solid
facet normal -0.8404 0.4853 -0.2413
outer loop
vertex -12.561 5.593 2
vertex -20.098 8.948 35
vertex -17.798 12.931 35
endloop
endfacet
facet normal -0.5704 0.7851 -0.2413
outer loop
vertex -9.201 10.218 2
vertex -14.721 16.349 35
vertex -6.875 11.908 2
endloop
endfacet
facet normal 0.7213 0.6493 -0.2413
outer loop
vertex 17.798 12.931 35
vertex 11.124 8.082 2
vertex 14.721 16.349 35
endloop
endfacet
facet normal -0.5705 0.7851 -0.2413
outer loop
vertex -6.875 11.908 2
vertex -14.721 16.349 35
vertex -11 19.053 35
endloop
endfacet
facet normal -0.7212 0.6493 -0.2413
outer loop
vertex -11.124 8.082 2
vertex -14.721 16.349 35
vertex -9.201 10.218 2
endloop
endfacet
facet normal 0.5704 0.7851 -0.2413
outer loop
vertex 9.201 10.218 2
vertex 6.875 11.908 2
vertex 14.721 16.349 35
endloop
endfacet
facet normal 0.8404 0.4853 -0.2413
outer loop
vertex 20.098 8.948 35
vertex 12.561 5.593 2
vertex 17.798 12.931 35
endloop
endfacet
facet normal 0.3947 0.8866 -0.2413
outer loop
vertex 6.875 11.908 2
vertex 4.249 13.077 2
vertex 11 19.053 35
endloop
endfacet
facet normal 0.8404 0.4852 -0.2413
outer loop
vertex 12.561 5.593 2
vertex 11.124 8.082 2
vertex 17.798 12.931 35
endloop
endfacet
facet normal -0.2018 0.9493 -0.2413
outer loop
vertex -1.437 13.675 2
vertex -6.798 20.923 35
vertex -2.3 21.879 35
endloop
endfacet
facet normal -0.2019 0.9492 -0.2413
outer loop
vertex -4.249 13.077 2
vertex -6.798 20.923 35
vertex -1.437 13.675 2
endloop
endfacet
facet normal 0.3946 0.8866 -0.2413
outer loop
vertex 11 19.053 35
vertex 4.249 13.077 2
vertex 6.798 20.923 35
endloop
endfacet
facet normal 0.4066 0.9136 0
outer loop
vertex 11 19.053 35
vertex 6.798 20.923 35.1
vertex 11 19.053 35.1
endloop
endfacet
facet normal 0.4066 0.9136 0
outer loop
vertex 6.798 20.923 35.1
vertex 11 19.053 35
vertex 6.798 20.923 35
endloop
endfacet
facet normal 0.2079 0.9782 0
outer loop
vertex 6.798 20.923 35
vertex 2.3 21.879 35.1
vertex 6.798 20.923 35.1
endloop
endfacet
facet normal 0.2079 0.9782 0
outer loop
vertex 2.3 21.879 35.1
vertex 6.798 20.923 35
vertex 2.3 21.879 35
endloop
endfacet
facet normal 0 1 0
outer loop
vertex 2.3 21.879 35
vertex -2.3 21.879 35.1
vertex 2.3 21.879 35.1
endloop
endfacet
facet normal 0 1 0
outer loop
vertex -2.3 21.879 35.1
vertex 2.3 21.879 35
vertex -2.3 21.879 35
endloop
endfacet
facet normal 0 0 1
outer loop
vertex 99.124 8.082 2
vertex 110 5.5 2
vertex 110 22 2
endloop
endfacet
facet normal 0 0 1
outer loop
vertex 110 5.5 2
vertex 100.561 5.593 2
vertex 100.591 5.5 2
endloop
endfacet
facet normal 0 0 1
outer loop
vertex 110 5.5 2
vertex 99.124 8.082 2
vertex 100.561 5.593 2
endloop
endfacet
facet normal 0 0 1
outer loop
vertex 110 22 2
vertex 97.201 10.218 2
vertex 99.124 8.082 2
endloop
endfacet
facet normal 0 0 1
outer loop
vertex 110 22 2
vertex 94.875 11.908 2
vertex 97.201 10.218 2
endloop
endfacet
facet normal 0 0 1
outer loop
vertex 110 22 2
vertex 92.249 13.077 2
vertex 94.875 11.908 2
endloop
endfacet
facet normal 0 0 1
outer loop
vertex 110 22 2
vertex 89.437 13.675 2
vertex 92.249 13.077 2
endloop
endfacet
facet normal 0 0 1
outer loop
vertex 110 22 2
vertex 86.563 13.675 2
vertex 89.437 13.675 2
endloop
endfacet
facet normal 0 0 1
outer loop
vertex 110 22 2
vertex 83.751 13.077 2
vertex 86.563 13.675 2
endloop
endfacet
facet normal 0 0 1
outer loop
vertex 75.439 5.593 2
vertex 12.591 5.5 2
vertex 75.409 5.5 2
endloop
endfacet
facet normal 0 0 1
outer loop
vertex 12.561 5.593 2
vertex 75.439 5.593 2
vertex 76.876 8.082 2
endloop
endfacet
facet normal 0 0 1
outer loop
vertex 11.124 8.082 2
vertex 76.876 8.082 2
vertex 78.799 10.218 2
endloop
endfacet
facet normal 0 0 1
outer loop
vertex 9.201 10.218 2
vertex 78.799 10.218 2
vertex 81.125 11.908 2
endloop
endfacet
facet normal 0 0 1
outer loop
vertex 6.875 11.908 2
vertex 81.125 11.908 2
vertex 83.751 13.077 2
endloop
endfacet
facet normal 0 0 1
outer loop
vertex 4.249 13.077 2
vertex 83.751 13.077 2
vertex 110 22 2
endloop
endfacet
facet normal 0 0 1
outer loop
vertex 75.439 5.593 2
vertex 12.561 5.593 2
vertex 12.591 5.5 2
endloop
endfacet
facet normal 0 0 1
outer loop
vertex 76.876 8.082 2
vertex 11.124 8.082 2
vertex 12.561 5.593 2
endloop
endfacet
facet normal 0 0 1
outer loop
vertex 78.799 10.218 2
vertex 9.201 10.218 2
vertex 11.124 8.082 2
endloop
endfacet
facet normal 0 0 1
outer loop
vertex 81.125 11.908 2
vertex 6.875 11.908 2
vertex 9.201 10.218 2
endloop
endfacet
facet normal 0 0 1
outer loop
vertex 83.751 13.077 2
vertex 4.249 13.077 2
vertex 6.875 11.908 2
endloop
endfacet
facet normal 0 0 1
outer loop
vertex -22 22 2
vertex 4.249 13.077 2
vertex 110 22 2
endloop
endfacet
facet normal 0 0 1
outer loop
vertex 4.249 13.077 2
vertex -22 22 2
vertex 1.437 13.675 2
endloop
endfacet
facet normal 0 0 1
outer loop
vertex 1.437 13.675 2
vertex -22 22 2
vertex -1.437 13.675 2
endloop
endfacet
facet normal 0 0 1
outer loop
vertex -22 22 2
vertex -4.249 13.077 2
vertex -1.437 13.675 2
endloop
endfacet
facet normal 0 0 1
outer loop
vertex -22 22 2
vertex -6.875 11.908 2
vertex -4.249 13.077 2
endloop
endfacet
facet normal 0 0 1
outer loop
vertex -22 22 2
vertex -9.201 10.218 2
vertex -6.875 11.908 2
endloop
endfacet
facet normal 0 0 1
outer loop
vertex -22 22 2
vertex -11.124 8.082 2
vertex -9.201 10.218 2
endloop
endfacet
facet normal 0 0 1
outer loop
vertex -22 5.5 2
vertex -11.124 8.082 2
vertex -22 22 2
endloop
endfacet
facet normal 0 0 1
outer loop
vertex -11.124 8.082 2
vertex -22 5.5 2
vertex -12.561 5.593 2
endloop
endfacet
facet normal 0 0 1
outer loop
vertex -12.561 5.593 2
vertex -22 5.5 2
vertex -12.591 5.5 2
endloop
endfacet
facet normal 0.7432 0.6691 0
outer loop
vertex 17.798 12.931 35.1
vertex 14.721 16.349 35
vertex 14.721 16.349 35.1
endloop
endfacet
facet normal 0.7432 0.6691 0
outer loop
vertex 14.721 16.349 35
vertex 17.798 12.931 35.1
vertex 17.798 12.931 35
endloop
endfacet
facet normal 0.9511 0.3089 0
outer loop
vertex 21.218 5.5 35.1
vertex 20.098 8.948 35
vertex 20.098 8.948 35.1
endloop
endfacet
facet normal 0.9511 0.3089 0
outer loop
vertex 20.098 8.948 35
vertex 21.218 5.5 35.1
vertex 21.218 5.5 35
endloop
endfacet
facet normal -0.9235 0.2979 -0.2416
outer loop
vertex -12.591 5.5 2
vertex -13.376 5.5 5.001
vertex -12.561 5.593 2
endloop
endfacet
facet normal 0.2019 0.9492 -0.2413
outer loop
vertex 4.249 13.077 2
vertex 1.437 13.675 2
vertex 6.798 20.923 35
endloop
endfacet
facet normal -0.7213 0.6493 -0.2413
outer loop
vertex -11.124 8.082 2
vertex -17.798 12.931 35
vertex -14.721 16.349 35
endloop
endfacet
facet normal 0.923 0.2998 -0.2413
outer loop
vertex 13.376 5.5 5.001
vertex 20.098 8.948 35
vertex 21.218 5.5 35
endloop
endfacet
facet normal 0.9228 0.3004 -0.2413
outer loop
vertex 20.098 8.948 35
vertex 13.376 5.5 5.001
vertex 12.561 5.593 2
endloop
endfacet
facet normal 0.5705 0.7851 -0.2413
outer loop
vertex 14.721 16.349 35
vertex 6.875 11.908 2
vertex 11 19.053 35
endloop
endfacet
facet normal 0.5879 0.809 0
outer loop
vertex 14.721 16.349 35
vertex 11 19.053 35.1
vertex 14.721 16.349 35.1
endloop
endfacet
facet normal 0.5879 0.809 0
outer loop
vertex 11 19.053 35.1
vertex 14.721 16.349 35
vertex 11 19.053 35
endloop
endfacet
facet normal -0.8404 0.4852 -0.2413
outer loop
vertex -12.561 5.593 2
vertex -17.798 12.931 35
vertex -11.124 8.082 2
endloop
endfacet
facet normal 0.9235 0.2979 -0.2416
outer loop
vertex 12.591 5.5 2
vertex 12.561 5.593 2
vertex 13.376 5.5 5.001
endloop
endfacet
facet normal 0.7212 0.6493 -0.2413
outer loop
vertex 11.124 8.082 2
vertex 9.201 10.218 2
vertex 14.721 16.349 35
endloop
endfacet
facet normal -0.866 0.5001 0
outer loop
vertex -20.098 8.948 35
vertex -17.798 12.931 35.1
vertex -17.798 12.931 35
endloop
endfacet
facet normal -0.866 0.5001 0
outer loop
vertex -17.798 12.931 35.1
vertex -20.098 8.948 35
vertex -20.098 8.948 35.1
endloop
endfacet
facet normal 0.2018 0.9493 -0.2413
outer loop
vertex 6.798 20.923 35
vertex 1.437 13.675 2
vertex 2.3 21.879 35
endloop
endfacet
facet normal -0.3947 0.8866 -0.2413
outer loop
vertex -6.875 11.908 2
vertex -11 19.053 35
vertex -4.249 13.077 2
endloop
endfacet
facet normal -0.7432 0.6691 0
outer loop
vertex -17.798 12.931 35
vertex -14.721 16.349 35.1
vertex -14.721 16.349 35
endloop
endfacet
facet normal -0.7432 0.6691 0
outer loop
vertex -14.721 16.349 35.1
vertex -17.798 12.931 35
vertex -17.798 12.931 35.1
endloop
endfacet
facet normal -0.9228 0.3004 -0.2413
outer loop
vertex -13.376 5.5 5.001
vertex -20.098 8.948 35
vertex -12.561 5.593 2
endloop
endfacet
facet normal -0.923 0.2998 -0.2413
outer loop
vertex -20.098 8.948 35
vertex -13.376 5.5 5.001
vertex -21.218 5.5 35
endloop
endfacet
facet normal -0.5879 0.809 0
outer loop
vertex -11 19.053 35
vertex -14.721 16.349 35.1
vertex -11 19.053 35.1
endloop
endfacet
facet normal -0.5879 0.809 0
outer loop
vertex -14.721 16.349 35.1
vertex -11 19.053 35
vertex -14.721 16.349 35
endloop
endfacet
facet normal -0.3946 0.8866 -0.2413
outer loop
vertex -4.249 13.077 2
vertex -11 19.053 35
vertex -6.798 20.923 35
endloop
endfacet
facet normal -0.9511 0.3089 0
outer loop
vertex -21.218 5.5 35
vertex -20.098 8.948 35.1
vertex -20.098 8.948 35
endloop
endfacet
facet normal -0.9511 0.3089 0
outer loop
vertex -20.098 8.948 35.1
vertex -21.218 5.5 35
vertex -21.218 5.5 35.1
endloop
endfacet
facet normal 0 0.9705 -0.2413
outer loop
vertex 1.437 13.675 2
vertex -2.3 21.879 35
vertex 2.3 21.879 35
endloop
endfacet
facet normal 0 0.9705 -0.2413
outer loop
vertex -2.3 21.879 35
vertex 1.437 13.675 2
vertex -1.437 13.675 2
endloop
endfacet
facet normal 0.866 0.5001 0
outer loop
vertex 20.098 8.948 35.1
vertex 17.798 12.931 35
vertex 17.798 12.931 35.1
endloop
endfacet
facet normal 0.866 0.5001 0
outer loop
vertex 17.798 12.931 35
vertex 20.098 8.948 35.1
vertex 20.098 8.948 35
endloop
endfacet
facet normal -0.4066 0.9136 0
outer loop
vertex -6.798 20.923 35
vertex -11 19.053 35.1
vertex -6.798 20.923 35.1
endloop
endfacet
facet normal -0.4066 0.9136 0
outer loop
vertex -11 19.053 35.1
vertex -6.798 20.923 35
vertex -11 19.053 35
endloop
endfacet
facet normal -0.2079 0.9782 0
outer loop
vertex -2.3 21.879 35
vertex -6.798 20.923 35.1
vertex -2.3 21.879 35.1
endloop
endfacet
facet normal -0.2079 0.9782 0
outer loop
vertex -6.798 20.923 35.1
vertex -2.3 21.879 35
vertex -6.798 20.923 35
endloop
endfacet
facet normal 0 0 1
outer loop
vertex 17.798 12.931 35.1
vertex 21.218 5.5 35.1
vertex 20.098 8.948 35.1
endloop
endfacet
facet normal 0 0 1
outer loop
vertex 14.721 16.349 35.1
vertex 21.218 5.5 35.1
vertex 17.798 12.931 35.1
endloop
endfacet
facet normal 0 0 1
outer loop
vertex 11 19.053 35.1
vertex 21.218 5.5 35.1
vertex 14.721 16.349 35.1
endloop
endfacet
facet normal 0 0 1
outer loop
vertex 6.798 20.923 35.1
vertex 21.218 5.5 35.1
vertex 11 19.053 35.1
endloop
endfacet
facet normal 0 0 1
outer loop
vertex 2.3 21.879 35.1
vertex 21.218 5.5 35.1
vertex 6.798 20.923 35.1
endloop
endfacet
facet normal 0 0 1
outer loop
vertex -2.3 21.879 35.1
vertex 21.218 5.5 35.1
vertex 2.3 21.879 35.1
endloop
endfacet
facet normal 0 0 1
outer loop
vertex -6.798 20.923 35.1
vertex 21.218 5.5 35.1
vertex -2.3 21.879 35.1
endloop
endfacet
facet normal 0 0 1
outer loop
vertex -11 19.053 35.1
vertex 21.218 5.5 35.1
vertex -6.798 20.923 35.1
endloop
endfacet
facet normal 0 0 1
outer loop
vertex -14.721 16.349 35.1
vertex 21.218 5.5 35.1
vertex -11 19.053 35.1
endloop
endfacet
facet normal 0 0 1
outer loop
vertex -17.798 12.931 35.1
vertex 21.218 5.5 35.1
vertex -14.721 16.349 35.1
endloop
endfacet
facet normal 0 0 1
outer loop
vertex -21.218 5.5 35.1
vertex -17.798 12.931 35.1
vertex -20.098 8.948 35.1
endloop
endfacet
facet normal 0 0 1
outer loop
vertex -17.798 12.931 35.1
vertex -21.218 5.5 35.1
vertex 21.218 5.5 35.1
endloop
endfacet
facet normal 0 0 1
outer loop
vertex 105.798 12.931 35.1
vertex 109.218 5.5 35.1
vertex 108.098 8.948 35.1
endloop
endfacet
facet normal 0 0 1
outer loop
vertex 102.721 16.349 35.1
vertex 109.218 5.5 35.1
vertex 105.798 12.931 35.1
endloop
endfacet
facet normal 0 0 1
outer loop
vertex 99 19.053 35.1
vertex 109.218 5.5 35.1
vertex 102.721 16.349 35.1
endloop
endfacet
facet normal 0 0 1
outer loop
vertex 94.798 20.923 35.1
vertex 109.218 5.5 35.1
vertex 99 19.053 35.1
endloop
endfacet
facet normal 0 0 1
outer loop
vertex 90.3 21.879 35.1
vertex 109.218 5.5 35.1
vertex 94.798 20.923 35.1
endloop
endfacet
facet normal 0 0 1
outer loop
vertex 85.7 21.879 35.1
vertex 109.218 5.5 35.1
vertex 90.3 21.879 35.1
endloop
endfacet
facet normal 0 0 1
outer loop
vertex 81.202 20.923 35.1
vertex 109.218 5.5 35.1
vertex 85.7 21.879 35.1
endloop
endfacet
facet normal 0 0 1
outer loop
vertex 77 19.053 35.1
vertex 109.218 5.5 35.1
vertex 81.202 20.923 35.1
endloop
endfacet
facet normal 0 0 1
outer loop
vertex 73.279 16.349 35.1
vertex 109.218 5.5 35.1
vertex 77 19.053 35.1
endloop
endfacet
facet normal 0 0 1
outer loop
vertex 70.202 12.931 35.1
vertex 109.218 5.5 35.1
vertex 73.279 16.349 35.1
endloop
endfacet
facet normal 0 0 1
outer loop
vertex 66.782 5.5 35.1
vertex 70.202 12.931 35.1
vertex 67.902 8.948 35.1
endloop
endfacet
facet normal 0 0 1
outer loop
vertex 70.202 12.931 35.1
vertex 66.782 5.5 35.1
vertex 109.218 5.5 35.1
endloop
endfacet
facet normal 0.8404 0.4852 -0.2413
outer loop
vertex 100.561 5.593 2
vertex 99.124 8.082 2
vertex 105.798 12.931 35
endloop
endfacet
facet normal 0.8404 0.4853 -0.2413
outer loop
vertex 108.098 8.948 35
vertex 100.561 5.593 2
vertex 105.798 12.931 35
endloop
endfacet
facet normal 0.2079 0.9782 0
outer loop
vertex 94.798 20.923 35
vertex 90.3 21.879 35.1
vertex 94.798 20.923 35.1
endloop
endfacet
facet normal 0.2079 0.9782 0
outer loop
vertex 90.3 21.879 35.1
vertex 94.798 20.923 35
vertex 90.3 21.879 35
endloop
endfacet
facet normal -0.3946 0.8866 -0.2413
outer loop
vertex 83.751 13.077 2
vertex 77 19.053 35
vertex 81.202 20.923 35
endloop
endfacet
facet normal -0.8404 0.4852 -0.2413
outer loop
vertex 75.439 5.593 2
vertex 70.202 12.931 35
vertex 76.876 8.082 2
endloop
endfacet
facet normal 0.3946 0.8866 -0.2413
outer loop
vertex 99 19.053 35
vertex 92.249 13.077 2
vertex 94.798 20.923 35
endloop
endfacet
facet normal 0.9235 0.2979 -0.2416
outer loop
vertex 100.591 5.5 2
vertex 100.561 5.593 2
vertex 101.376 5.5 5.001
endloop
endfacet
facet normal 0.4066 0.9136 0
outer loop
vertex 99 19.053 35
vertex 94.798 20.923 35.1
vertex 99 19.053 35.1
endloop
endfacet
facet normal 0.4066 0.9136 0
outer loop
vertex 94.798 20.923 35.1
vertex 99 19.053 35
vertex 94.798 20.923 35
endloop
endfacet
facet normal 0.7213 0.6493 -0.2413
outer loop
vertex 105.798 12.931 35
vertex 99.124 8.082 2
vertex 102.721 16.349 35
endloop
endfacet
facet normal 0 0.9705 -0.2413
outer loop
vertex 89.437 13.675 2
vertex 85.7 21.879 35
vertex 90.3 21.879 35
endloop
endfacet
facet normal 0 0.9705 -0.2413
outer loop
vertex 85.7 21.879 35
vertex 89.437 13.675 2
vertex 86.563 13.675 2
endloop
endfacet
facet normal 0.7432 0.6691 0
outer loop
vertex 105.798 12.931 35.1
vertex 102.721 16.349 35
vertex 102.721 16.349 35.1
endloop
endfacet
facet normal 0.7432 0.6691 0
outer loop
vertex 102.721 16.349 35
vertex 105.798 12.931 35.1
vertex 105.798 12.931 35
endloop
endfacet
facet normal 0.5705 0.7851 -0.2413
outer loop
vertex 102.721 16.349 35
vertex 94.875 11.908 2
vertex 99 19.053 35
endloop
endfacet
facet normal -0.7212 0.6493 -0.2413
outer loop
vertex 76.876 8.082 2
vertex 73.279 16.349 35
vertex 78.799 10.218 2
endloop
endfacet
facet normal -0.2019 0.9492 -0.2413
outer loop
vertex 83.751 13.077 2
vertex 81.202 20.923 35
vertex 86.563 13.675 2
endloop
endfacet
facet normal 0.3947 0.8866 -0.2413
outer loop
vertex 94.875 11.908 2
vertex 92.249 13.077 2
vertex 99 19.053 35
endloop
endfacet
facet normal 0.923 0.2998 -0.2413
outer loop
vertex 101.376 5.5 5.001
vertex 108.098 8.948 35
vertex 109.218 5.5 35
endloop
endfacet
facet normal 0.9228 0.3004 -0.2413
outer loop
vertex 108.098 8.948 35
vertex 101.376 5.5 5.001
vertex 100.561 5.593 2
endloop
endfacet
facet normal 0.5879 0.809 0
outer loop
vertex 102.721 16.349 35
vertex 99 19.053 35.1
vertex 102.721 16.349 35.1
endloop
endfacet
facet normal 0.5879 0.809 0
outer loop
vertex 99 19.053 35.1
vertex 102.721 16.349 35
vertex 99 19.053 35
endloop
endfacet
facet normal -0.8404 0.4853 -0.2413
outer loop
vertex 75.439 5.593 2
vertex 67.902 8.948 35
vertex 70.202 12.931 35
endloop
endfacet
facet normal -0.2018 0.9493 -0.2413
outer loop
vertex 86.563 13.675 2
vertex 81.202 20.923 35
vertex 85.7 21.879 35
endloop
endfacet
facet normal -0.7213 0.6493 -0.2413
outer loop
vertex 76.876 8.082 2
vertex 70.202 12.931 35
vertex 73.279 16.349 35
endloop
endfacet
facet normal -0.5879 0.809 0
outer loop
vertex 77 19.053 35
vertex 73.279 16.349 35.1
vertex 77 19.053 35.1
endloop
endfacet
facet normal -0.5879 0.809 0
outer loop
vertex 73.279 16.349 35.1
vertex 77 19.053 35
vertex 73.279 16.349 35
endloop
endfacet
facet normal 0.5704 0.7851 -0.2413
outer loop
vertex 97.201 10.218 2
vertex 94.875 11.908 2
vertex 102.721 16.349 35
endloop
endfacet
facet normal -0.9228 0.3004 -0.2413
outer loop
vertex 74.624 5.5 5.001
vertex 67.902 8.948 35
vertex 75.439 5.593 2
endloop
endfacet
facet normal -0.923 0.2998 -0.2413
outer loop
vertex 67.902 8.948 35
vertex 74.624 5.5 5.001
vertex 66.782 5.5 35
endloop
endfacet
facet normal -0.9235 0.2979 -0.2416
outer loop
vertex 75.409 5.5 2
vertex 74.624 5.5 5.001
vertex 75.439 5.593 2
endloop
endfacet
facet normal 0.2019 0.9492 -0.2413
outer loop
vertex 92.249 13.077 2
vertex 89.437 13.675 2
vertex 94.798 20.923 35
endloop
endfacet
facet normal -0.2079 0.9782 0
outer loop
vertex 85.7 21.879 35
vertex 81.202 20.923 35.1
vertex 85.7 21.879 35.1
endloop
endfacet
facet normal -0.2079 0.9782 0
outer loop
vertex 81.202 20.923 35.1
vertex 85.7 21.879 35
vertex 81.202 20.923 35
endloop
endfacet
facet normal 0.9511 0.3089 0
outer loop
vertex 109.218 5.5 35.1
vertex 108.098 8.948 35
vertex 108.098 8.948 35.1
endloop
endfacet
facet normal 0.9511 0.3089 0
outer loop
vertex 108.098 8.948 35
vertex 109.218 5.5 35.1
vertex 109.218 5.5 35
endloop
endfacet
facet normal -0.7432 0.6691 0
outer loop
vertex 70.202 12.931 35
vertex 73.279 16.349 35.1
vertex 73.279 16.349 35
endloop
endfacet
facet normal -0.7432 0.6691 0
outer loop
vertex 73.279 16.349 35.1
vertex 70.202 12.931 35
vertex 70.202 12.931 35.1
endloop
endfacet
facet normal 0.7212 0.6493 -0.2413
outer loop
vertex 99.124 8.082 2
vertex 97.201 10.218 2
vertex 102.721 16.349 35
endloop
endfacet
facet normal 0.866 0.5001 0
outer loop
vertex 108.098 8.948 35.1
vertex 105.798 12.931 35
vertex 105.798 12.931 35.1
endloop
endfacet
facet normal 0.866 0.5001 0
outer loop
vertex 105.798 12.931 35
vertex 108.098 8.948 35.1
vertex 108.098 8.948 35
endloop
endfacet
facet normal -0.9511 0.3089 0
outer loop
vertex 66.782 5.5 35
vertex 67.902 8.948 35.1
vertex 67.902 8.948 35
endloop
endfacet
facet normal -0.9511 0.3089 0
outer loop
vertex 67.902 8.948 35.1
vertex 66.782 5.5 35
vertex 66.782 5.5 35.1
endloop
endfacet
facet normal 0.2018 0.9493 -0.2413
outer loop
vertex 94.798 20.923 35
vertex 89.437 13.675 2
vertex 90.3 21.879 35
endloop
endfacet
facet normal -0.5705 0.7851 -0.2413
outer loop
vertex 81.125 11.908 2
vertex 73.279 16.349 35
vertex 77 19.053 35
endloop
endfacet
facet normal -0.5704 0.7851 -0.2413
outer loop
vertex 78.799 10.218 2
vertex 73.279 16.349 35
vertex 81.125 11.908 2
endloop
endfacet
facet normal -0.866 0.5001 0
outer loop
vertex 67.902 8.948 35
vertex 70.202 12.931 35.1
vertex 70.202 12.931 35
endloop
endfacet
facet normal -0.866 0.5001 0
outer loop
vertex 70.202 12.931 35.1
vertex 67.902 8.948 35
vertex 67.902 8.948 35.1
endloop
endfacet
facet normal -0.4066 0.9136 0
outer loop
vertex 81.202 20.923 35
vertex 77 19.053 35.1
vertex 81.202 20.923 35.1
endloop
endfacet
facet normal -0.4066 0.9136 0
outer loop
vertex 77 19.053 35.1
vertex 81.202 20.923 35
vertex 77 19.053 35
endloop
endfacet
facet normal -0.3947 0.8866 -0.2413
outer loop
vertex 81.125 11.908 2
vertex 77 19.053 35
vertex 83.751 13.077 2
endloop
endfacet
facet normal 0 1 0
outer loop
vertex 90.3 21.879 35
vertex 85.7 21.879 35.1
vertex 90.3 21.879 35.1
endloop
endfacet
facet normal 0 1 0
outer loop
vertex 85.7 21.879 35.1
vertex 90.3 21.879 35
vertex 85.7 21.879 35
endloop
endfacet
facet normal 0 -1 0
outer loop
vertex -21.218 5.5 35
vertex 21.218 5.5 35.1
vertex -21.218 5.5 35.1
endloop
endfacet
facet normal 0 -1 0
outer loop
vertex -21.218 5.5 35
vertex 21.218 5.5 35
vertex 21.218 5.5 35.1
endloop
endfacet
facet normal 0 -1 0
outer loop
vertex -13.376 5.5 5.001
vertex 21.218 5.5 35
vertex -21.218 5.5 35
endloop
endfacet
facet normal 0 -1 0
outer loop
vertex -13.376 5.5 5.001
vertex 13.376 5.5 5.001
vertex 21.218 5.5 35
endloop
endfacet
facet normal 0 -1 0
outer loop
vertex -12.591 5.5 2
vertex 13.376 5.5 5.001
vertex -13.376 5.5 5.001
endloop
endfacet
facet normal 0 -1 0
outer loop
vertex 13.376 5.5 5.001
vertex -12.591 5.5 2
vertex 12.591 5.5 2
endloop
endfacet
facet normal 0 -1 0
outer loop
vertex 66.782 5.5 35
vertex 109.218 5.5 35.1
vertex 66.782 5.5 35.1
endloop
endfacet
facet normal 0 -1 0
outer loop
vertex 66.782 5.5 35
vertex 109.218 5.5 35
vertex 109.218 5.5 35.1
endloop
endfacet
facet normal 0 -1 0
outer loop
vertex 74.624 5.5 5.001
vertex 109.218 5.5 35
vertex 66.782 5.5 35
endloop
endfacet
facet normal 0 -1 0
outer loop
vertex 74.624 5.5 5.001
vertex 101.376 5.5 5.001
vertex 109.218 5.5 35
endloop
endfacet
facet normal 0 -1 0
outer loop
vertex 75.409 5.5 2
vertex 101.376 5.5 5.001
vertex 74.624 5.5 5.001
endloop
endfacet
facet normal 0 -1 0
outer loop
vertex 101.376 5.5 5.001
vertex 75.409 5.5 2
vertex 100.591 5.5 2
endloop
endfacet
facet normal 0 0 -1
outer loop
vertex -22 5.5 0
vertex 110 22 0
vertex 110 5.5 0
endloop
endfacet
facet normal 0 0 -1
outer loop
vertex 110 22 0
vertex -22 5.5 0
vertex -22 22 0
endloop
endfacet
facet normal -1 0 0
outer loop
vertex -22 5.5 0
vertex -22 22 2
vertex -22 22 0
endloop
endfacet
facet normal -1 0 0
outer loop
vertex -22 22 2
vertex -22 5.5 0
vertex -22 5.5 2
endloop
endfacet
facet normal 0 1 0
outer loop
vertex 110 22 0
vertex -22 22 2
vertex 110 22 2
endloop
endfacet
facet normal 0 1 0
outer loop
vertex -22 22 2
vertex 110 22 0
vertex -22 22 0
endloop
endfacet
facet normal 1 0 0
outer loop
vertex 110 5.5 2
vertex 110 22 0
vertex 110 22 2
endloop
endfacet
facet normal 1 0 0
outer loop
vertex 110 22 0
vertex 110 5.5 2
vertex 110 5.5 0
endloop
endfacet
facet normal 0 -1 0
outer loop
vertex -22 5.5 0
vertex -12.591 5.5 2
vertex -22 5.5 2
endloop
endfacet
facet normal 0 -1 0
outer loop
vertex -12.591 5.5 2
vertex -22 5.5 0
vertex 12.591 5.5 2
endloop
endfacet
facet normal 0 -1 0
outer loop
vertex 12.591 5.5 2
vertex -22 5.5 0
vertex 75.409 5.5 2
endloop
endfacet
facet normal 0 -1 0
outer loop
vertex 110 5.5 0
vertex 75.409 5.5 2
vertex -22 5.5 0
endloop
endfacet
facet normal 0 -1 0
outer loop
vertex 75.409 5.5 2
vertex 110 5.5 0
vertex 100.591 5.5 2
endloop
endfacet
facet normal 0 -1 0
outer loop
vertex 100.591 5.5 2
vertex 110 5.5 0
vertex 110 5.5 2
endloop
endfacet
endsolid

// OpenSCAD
$width = 88; // noch genau ausmessen, passt
$dia = $width / 2; //ne leichte rundung
$schwertdicke = 33; //noch genau messen, passt
$thick_holder = $schwertdicke/2;
$thickness = 2;



translate([-$dia/2,$dia/2-$thick_holder,0])
linear_extrude(height=$thickness)
square([$dia+$width,$thick_holder]);



translate([0,0,$thickness])
difference() {

holders() ;
    
linear_extrude(height=$schwertdicke+0.1)
translate([-$dia/2, -$dia/2-$thick_holder, 0])
square([$dia+$width,$dia]);

}

module holders() 
{
    hull() {
    
    linear_extrude(height=0.1)
circle(d=$dia-$thick_holder);
    
    translate([0,0,$schwertdicke])
linear_extrude(height=0.1)
circle(d=$dia);
}
hull() {
translate([$width,0,0])
linear_extrude(height=0.1)
circle(d=$dia-$thick_holder);

translate([$width,0,$schwertdicke])
linear_extrude(height=0.1)
circle(d=$dia);
}
}
